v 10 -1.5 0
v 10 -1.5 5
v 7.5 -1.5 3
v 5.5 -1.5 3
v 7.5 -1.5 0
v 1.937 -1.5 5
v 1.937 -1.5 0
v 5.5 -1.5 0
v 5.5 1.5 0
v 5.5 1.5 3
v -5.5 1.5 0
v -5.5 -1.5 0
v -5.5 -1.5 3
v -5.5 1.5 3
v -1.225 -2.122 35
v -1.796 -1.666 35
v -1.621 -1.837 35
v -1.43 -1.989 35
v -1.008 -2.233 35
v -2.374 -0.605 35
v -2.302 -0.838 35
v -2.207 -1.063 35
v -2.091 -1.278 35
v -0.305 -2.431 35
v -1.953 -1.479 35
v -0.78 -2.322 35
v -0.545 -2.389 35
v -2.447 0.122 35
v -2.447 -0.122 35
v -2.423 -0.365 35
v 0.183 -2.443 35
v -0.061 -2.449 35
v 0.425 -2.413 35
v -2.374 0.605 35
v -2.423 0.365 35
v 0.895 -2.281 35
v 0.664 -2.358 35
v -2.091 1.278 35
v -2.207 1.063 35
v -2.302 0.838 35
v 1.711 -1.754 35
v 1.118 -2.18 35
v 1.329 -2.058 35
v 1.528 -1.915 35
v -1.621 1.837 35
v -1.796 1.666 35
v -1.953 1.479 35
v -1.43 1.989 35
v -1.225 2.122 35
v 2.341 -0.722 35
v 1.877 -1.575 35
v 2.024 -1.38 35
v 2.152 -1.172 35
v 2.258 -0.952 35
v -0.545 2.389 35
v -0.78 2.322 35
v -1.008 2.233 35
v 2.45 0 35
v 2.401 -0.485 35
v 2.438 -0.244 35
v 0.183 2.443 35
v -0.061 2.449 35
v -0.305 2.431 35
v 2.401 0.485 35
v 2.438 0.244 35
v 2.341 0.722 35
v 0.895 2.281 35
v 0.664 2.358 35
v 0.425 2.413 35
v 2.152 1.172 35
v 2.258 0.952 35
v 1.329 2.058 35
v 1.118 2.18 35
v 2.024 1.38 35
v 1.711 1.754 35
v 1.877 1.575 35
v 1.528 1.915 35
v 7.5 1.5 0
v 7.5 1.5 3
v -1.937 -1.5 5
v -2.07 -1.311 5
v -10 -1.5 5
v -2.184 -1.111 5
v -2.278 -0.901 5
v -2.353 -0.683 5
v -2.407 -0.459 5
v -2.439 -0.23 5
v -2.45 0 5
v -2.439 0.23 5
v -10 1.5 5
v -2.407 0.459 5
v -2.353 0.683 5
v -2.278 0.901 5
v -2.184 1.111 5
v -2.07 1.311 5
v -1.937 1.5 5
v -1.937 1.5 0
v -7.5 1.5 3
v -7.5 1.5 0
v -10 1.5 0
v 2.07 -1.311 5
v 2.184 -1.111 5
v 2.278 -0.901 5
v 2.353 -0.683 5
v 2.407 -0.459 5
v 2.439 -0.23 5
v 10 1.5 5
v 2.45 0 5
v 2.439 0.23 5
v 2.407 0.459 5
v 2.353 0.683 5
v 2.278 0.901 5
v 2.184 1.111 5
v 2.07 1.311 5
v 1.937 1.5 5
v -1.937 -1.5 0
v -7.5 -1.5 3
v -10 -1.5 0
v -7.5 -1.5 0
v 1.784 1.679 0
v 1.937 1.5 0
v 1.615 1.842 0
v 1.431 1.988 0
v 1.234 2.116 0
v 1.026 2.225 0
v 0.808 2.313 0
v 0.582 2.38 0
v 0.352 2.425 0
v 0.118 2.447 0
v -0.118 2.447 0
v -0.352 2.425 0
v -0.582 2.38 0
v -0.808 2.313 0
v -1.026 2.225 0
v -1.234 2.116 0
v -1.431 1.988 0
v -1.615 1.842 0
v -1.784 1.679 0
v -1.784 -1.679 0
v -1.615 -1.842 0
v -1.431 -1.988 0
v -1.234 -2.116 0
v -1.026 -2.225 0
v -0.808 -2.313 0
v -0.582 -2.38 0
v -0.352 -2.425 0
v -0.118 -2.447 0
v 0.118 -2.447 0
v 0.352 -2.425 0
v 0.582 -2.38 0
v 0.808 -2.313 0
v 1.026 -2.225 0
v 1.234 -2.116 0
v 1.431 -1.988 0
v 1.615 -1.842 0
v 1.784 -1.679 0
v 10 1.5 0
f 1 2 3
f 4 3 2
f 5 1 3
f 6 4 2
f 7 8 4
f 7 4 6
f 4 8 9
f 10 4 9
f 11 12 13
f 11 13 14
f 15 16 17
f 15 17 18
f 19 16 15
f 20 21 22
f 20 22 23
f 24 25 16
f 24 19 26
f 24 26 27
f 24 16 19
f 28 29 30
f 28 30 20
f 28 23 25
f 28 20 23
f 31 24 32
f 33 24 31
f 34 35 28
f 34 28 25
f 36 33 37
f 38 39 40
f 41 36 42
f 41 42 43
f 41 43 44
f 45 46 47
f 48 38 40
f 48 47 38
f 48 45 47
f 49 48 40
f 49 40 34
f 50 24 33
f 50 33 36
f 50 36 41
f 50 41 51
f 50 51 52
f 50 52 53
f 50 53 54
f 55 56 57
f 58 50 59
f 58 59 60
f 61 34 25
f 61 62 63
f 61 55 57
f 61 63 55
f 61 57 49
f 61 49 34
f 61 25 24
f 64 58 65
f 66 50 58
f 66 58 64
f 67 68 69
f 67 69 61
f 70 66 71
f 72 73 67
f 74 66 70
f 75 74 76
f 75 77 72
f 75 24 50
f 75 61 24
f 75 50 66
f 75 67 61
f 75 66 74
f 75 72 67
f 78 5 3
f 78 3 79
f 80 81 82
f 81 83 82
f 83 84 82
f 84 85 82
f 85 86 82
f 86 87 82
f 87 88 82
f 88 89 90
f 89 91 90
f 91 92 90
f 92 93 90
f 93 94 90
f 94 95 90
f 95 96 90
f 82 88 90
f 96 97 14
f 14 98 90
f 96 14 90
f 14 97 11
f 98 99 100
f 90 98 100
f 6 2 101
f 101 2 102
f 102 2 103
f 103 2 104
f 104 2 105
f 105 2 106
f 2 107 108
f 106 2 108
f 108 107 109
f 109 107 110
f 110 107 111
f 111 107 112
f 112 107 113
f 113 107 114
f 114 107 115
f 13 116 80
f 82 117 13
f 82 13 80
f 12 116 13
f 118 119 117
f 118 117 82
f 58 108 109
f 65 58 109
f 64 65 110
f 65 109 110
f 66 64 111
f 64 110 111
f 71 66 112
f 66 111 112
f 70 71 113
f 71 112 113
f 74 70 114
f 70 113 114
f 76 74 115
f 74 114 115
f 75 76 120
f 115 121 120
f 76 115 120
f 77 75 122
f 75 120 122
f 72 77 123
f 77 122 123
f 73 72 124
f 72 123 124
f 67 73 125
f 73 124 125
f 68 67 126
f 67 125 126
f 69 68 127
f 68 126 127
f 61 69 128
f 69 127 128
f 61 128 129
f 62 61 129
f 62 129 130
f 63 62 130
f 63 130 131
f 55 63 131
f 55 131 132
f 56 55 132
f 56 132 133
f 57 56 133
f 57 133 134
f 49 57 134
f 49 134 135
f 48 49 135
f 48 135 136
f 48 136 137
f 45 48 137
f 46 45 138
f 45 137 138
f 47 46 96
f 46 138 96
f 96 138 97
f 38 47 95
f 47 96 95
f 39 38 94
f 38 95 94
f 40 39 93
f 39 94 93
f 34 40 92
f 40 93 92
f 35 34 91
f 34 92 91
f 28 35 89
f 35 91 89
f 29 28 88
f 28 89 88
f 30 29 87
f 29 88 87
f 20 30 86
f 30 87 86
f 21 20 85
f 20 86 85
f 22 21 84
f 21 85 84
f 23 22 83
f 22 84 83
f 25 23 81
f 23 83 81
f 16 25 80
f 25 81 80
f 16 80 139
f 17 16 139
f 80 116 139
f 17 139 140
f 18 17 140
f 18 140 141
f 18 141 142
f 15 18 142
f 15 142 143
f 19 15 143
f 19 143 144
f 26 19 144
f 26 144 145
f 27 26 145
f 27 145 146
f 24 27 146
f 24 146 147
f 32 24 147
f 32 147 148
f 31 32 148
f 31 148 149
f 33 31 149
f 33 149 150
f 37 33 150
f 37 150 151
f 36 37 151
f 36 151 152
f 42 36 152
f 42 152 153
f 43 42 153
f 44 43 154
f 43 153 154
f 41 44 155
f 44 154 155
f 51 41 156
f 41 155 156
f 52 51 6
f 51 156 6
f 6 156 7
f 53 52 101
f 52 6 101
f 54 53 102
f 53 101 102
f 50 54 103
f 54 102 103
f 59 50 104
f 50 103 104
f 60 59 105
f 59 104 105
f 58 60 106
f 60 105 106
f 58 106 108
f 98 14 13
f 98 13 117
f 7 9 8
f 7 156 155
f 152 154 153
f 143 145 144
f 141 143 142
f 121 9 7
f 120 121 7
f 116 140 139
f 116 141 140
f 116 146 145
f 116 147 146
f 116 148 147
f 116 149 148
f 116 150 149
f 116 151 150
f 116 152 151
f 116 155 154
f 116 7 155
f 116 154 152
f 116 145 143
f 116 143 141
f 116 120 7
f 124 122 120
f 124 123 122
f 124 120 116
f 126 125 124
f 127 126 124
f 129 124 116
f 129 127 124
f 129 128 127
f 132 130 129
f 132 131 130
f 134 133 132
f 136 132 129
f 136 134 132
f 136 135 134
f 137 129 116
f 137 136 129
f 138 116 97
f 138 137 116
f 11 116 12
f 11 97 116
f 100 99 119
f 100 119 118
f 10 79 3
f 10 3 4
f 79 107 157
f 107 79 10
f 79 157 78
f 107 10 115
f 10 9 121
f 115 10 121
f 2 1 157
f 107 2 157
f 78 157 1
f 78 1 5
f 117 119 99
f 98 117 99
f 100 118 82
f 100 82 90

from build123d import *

# Parameters (mm, degrees)
SKETCH2_R           = 2.45
BOSS_EXTRUDE1_DEPTH = 35
SKETCH3_W           = 20
SKETCH3_H           = 3
BOSS_EXTRUDE2_DEPTH = 5
SKETCH4_W           = 2
SKETCH4_H           = 3
CUT_EXTRUDE1_DEPTH  = 3


with BuildPart() as part:
    # Sketch2 → Boss-Extrude1 (new body)
    with BuildSketch(Plane.XY):
        Circle(SKETCH2_R)
    extrude(amount=BOSS_EXTRUDE1_DEPTH)

    # Sketch3 → Boss-Extrude2 (add)
    with BuildSketch(Plane(origin=(0, 0, 0), x_dir=(-1, 0, 0), z_dir=(0, 0, -1))):
        Rectangle(SKETCH3_W, SKETCH3_H)
    extrude(amount=-BOSS_EXTRUDE2_DEPTH)

    # Sketch4 → Cut-Extrude1 (cut)
    with BuildSketch(Plane(origin=(0, 0, 0), x_dir=(-1, 0, 0), z_dir=(0, 0, -1))):
        with Locations((-6.5, 0)):
            Rectangle(SKETCH4_W, SKETCH4_H)
        with Locations((6.5, 0)):
            Rectangle(SKETCH4_W, SKETCH4_H)
    extrude(amount=-CUT_EXTRUDE1_DEPTH, mode=Mode.SUBTRACT)


solid = part.part
